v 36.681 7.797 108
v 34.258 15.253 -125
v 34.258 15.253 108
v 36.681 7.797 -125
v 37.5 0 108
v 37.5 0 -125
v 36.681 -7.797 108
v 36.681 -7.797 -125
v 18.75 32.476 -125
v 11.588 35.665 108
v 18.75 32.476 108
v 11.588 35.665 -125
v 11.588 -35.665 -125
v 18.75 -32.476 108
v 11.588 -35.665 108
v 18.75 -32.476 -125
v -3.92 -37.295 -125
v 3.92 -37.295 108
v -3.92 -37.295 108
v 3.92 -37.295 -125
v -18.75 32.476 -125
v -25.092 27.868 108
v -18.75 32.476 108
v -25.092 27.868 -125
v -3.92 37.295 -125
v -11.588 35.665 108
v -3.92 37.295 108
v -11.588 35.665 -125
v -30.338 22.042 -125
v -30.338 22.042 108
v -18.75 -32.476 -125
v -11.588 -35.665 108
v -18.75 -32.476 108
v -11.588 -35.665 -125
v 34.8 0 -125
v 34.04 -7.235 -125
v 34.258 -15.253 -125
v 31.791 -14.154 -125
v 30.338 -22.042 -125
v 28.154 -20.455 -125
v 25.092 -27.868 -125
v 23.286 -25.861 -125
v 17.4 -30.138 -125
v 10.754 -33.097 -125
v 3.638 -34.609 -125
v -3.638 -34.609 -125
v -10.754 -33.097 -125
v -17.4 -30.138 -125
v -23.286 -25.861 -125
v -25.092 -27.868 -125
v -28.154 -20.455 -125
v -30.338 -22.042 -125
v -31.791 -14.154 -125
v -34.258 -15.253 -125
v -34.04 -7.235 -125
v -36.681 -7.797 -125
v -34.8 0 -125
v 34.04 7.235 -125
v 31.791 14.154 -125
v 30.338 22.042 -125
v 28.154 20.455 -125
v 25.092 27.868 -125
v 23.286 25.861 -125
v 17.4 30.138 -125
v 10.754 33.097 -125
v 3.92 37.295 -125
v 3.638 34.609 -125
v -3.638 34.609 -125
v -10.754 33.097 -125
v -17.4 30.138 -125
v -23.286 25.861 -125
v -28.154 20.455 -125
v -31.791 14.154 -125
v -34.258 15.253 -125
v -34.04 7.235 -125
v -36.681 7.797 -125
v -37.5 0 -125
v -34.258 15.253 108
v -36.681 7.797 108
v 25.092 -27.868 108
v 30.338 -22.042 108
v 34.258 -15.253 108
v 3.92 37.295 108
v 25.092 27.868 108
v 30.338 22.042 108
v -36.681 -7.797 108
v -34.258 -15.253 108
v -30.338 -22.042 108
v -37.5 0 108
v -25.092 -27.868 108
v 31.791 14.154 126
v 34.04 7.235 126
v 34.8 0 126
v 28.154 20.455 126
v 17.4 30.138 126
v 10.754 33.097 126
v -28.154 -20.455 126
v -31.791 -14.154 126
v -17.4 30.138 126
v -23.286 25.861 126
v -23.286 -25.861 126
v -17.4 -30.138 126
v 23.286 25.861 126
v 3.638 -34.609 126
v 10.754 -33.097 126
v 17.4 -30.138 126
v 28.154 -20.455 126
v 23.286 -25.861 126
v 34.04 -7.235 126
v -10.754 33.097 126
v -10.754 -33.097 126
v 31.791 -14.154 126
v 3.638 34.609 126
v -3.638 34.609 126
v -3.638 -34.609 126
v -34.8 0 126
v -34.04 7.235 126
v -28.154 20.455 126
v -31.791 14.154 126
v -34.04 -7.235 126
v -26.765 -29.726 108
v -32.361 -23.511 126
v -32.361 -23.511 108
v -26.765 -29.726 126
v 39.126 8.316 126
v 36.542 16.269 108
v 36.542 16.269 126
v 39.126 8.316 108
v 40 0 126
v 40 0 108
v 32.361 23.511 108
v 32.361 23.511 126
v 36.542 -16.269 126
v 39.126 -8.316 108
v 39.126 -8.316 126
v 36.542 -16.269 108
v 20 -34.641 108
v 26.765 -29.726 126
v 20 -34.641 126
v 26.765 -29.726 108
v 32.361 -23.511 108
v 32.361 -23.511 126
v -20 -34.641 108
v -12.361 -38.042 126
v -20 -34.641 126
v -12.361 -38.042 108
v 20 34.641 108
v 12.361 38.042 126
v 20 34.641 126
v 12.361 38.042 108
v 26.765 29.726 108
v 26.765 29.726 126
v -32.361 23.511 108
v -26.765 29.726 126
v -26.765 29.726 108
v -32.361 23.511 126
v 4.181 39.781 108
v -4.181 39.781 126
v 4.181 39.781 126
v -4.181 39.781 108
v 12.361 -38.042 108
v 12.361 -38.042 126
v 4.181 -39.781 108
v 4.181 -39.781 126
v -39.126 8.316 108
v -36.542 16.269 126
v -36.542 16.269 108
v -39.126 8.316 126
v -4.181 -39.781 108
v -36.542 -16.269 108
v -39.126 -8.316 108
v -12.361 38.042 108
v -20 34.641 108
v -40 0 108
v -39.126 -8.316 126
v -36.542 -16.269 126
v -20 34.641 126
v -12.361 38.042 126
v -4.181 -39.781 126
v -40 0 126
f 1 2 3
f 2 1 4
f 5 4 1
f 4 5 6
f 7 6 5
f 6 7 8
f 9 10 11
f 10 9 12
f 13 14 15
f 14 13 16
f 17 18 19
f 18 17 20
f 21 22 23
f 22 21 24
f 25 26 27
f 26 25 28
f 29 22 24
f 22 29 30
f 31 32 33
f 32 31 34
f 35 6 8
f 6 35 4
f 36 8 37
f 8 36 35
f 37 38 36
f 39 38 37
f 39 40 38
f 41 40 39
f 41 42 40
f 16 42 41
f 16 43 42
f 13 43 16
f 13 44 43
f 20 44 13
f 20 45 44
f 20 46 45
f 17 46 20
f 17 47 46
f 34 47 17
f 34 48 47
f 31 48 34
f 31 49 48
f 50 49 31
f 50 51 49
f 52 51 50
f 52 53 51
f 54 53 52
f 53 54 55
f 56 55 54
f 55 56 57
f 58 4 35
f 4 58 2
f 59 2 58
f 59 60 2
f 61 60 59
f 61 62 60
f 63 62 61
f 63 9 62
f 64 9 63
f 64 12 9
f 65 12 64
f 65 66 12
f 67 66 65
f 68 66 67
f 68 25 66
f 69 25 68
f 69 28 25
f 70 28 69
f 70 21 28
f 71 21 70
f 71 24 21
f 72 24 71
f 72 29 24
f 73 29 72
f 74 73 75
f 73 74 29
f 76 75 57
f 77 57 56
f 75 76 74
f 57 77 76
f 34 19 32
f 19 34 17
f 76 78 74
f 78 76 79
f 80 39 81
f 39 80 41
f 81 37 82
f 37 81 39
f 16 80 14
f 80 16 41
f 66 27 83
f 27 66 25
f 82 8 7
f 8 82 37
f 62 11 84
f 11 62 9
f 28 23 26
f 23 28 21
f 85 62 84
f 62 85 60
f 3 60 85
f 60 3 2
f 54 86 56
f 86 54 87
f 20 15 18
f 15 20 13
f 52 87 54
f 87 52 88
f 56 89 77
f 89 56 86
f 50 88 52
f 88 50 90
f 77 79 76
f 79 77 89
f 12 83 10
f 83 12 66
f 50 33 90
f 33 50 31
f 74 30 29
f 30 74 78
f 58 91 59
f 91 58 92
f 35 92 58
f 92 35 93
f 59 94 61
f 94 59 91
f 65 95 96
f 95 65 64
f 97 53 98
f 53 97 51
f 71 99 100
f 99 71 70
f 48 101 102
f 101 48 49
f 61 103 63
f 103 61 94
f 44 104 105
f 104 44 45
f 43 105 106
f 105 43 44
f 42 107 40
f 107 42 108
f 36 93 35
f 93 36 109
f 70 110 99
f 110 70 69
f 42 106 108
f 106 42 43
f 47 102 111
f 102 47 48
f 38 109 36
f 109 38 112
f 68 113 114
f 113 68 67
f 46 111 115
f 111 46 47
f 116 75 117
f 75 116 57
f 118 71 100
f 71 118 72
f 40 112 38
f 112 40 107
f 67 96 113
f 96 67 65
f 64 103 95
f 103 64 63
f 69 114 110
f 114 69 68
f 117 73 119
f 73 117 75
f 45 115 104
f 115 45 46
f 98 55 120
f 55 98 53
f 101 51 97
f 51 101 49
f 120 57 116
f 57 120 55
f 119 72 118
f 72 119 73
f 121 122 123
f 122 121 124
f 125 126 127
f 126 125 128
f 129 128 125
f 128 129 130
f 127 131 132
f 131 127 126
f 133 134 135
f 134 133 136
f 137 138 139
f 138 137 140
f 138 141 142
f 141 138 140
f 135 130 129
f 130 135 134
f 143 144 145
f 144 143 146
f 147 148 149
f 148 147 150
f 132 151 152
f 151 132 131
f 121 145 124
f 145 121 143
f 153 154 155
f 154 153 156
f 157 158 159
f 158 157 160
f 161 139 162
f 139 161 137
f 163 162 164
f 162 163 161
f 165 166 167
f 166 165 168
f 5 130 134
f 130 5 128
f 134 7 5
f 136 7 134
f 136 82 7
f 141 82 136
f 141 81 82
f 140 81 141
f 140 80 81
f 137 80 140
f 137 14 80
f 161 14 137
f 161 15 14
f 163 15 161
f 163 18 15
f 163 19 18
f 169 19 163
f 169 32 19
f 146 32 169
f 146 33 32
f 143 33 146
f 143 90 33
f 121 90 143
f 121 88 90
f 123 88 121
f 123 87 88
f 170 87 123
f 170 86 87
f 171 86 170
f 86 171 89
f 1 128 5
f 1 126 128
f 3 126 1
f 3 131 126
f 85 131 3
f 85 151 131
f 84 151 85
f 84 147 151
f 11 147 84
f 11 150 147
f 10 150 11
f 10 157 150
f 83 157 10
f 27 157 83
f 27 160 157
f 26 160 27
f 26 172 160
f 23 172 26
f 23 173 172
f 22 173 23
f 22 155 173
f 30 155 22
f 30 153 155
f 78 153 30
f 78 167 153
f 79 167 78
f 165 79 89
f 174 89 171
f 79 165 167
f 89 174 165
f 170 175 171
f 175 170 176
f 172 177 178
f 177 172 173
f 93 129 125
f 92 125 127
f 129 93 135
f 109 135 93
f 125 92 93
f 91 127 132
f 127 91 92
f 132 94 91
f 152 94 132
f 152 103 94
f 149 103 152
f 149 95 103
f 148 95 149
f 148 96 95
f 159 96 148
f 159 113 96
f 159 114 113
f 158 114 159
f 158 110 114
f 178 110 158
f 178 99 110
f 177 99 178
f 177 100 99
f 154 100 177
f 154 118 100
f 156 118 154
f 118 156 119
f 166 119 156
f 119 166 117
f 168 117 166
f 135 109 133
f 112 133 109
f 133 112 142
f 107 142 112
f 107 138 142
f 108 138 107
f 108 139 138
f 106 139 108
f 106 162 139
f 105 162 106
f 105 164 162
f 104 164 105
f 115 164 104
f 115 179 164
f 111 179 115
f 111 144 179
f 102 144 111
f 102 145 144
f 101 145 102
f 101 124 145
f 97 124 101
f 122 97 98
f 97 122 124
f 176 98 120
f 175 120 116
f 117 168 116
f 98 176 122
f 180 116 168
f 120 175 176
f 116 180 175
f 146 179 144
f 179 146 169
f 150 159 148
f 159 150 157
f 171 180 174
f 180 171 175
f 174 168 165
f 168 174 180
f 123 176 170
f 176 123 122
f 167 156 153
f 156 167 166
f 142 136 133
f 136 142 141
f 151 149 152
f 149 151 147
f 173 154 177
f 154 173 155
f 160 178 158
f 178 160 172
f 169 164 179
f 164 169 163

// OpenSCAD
// Parameters
length_mm = 250; //[125:500:1]
ht75_outer_diameter_mm = 75; //[60:90:0.5]
ht75_wall_thickness_mm = 2.7; //[1.5:5:0.1]
include_end_fitting = 1; //[0:1:1]
end_fitting_length_mm = 18; //[8:40:1]
end_fitting_radial_thickness_mm = 2.5; //[1:6:0.1]
overlap_mm = 1; //[0.5:2:0.1]

// HT Pipe - complete geometry
module ht_pipe() {
  color([0.85, 0.85, 0.8]) {
    // Main pipe segment
    difference() {
      cylinder(h=length_mm, r=ht75_outer_diameter_mm/2, center=true);
      translate([0, 0, 0])
        cylinder(h=length_mm + 2*overlap_mm, r=ht75_outer_diameter_mm/2 - ht75_wall_thickness_mm, center=true);
    }
    
    // End fitting interface ring
    if (include_end_fitting) {
      difference() {
        translate([0, 0, length_mm/2 - end_fitting_length_mm/2 + overlap_mm])
          cylinder(h=end_fitting_length_mm, r=ht75_outer_diameter_mm/2 + end_fitting_radial_thickness_mm, center=true);
        translate([0, 0, length_mm/2 - end_fitting_length_mm/2 + overlap_mm])
          cylinder(h=end_fitting_length_mm + 2*overlap_mm, r=ht75_outer_diameter_mm/2 - ht75_wall_thickness_mm, center=true);
      }
    }
  }
}

// Assembly
module assembly() {
  ht_pipe();
}

assembly();
